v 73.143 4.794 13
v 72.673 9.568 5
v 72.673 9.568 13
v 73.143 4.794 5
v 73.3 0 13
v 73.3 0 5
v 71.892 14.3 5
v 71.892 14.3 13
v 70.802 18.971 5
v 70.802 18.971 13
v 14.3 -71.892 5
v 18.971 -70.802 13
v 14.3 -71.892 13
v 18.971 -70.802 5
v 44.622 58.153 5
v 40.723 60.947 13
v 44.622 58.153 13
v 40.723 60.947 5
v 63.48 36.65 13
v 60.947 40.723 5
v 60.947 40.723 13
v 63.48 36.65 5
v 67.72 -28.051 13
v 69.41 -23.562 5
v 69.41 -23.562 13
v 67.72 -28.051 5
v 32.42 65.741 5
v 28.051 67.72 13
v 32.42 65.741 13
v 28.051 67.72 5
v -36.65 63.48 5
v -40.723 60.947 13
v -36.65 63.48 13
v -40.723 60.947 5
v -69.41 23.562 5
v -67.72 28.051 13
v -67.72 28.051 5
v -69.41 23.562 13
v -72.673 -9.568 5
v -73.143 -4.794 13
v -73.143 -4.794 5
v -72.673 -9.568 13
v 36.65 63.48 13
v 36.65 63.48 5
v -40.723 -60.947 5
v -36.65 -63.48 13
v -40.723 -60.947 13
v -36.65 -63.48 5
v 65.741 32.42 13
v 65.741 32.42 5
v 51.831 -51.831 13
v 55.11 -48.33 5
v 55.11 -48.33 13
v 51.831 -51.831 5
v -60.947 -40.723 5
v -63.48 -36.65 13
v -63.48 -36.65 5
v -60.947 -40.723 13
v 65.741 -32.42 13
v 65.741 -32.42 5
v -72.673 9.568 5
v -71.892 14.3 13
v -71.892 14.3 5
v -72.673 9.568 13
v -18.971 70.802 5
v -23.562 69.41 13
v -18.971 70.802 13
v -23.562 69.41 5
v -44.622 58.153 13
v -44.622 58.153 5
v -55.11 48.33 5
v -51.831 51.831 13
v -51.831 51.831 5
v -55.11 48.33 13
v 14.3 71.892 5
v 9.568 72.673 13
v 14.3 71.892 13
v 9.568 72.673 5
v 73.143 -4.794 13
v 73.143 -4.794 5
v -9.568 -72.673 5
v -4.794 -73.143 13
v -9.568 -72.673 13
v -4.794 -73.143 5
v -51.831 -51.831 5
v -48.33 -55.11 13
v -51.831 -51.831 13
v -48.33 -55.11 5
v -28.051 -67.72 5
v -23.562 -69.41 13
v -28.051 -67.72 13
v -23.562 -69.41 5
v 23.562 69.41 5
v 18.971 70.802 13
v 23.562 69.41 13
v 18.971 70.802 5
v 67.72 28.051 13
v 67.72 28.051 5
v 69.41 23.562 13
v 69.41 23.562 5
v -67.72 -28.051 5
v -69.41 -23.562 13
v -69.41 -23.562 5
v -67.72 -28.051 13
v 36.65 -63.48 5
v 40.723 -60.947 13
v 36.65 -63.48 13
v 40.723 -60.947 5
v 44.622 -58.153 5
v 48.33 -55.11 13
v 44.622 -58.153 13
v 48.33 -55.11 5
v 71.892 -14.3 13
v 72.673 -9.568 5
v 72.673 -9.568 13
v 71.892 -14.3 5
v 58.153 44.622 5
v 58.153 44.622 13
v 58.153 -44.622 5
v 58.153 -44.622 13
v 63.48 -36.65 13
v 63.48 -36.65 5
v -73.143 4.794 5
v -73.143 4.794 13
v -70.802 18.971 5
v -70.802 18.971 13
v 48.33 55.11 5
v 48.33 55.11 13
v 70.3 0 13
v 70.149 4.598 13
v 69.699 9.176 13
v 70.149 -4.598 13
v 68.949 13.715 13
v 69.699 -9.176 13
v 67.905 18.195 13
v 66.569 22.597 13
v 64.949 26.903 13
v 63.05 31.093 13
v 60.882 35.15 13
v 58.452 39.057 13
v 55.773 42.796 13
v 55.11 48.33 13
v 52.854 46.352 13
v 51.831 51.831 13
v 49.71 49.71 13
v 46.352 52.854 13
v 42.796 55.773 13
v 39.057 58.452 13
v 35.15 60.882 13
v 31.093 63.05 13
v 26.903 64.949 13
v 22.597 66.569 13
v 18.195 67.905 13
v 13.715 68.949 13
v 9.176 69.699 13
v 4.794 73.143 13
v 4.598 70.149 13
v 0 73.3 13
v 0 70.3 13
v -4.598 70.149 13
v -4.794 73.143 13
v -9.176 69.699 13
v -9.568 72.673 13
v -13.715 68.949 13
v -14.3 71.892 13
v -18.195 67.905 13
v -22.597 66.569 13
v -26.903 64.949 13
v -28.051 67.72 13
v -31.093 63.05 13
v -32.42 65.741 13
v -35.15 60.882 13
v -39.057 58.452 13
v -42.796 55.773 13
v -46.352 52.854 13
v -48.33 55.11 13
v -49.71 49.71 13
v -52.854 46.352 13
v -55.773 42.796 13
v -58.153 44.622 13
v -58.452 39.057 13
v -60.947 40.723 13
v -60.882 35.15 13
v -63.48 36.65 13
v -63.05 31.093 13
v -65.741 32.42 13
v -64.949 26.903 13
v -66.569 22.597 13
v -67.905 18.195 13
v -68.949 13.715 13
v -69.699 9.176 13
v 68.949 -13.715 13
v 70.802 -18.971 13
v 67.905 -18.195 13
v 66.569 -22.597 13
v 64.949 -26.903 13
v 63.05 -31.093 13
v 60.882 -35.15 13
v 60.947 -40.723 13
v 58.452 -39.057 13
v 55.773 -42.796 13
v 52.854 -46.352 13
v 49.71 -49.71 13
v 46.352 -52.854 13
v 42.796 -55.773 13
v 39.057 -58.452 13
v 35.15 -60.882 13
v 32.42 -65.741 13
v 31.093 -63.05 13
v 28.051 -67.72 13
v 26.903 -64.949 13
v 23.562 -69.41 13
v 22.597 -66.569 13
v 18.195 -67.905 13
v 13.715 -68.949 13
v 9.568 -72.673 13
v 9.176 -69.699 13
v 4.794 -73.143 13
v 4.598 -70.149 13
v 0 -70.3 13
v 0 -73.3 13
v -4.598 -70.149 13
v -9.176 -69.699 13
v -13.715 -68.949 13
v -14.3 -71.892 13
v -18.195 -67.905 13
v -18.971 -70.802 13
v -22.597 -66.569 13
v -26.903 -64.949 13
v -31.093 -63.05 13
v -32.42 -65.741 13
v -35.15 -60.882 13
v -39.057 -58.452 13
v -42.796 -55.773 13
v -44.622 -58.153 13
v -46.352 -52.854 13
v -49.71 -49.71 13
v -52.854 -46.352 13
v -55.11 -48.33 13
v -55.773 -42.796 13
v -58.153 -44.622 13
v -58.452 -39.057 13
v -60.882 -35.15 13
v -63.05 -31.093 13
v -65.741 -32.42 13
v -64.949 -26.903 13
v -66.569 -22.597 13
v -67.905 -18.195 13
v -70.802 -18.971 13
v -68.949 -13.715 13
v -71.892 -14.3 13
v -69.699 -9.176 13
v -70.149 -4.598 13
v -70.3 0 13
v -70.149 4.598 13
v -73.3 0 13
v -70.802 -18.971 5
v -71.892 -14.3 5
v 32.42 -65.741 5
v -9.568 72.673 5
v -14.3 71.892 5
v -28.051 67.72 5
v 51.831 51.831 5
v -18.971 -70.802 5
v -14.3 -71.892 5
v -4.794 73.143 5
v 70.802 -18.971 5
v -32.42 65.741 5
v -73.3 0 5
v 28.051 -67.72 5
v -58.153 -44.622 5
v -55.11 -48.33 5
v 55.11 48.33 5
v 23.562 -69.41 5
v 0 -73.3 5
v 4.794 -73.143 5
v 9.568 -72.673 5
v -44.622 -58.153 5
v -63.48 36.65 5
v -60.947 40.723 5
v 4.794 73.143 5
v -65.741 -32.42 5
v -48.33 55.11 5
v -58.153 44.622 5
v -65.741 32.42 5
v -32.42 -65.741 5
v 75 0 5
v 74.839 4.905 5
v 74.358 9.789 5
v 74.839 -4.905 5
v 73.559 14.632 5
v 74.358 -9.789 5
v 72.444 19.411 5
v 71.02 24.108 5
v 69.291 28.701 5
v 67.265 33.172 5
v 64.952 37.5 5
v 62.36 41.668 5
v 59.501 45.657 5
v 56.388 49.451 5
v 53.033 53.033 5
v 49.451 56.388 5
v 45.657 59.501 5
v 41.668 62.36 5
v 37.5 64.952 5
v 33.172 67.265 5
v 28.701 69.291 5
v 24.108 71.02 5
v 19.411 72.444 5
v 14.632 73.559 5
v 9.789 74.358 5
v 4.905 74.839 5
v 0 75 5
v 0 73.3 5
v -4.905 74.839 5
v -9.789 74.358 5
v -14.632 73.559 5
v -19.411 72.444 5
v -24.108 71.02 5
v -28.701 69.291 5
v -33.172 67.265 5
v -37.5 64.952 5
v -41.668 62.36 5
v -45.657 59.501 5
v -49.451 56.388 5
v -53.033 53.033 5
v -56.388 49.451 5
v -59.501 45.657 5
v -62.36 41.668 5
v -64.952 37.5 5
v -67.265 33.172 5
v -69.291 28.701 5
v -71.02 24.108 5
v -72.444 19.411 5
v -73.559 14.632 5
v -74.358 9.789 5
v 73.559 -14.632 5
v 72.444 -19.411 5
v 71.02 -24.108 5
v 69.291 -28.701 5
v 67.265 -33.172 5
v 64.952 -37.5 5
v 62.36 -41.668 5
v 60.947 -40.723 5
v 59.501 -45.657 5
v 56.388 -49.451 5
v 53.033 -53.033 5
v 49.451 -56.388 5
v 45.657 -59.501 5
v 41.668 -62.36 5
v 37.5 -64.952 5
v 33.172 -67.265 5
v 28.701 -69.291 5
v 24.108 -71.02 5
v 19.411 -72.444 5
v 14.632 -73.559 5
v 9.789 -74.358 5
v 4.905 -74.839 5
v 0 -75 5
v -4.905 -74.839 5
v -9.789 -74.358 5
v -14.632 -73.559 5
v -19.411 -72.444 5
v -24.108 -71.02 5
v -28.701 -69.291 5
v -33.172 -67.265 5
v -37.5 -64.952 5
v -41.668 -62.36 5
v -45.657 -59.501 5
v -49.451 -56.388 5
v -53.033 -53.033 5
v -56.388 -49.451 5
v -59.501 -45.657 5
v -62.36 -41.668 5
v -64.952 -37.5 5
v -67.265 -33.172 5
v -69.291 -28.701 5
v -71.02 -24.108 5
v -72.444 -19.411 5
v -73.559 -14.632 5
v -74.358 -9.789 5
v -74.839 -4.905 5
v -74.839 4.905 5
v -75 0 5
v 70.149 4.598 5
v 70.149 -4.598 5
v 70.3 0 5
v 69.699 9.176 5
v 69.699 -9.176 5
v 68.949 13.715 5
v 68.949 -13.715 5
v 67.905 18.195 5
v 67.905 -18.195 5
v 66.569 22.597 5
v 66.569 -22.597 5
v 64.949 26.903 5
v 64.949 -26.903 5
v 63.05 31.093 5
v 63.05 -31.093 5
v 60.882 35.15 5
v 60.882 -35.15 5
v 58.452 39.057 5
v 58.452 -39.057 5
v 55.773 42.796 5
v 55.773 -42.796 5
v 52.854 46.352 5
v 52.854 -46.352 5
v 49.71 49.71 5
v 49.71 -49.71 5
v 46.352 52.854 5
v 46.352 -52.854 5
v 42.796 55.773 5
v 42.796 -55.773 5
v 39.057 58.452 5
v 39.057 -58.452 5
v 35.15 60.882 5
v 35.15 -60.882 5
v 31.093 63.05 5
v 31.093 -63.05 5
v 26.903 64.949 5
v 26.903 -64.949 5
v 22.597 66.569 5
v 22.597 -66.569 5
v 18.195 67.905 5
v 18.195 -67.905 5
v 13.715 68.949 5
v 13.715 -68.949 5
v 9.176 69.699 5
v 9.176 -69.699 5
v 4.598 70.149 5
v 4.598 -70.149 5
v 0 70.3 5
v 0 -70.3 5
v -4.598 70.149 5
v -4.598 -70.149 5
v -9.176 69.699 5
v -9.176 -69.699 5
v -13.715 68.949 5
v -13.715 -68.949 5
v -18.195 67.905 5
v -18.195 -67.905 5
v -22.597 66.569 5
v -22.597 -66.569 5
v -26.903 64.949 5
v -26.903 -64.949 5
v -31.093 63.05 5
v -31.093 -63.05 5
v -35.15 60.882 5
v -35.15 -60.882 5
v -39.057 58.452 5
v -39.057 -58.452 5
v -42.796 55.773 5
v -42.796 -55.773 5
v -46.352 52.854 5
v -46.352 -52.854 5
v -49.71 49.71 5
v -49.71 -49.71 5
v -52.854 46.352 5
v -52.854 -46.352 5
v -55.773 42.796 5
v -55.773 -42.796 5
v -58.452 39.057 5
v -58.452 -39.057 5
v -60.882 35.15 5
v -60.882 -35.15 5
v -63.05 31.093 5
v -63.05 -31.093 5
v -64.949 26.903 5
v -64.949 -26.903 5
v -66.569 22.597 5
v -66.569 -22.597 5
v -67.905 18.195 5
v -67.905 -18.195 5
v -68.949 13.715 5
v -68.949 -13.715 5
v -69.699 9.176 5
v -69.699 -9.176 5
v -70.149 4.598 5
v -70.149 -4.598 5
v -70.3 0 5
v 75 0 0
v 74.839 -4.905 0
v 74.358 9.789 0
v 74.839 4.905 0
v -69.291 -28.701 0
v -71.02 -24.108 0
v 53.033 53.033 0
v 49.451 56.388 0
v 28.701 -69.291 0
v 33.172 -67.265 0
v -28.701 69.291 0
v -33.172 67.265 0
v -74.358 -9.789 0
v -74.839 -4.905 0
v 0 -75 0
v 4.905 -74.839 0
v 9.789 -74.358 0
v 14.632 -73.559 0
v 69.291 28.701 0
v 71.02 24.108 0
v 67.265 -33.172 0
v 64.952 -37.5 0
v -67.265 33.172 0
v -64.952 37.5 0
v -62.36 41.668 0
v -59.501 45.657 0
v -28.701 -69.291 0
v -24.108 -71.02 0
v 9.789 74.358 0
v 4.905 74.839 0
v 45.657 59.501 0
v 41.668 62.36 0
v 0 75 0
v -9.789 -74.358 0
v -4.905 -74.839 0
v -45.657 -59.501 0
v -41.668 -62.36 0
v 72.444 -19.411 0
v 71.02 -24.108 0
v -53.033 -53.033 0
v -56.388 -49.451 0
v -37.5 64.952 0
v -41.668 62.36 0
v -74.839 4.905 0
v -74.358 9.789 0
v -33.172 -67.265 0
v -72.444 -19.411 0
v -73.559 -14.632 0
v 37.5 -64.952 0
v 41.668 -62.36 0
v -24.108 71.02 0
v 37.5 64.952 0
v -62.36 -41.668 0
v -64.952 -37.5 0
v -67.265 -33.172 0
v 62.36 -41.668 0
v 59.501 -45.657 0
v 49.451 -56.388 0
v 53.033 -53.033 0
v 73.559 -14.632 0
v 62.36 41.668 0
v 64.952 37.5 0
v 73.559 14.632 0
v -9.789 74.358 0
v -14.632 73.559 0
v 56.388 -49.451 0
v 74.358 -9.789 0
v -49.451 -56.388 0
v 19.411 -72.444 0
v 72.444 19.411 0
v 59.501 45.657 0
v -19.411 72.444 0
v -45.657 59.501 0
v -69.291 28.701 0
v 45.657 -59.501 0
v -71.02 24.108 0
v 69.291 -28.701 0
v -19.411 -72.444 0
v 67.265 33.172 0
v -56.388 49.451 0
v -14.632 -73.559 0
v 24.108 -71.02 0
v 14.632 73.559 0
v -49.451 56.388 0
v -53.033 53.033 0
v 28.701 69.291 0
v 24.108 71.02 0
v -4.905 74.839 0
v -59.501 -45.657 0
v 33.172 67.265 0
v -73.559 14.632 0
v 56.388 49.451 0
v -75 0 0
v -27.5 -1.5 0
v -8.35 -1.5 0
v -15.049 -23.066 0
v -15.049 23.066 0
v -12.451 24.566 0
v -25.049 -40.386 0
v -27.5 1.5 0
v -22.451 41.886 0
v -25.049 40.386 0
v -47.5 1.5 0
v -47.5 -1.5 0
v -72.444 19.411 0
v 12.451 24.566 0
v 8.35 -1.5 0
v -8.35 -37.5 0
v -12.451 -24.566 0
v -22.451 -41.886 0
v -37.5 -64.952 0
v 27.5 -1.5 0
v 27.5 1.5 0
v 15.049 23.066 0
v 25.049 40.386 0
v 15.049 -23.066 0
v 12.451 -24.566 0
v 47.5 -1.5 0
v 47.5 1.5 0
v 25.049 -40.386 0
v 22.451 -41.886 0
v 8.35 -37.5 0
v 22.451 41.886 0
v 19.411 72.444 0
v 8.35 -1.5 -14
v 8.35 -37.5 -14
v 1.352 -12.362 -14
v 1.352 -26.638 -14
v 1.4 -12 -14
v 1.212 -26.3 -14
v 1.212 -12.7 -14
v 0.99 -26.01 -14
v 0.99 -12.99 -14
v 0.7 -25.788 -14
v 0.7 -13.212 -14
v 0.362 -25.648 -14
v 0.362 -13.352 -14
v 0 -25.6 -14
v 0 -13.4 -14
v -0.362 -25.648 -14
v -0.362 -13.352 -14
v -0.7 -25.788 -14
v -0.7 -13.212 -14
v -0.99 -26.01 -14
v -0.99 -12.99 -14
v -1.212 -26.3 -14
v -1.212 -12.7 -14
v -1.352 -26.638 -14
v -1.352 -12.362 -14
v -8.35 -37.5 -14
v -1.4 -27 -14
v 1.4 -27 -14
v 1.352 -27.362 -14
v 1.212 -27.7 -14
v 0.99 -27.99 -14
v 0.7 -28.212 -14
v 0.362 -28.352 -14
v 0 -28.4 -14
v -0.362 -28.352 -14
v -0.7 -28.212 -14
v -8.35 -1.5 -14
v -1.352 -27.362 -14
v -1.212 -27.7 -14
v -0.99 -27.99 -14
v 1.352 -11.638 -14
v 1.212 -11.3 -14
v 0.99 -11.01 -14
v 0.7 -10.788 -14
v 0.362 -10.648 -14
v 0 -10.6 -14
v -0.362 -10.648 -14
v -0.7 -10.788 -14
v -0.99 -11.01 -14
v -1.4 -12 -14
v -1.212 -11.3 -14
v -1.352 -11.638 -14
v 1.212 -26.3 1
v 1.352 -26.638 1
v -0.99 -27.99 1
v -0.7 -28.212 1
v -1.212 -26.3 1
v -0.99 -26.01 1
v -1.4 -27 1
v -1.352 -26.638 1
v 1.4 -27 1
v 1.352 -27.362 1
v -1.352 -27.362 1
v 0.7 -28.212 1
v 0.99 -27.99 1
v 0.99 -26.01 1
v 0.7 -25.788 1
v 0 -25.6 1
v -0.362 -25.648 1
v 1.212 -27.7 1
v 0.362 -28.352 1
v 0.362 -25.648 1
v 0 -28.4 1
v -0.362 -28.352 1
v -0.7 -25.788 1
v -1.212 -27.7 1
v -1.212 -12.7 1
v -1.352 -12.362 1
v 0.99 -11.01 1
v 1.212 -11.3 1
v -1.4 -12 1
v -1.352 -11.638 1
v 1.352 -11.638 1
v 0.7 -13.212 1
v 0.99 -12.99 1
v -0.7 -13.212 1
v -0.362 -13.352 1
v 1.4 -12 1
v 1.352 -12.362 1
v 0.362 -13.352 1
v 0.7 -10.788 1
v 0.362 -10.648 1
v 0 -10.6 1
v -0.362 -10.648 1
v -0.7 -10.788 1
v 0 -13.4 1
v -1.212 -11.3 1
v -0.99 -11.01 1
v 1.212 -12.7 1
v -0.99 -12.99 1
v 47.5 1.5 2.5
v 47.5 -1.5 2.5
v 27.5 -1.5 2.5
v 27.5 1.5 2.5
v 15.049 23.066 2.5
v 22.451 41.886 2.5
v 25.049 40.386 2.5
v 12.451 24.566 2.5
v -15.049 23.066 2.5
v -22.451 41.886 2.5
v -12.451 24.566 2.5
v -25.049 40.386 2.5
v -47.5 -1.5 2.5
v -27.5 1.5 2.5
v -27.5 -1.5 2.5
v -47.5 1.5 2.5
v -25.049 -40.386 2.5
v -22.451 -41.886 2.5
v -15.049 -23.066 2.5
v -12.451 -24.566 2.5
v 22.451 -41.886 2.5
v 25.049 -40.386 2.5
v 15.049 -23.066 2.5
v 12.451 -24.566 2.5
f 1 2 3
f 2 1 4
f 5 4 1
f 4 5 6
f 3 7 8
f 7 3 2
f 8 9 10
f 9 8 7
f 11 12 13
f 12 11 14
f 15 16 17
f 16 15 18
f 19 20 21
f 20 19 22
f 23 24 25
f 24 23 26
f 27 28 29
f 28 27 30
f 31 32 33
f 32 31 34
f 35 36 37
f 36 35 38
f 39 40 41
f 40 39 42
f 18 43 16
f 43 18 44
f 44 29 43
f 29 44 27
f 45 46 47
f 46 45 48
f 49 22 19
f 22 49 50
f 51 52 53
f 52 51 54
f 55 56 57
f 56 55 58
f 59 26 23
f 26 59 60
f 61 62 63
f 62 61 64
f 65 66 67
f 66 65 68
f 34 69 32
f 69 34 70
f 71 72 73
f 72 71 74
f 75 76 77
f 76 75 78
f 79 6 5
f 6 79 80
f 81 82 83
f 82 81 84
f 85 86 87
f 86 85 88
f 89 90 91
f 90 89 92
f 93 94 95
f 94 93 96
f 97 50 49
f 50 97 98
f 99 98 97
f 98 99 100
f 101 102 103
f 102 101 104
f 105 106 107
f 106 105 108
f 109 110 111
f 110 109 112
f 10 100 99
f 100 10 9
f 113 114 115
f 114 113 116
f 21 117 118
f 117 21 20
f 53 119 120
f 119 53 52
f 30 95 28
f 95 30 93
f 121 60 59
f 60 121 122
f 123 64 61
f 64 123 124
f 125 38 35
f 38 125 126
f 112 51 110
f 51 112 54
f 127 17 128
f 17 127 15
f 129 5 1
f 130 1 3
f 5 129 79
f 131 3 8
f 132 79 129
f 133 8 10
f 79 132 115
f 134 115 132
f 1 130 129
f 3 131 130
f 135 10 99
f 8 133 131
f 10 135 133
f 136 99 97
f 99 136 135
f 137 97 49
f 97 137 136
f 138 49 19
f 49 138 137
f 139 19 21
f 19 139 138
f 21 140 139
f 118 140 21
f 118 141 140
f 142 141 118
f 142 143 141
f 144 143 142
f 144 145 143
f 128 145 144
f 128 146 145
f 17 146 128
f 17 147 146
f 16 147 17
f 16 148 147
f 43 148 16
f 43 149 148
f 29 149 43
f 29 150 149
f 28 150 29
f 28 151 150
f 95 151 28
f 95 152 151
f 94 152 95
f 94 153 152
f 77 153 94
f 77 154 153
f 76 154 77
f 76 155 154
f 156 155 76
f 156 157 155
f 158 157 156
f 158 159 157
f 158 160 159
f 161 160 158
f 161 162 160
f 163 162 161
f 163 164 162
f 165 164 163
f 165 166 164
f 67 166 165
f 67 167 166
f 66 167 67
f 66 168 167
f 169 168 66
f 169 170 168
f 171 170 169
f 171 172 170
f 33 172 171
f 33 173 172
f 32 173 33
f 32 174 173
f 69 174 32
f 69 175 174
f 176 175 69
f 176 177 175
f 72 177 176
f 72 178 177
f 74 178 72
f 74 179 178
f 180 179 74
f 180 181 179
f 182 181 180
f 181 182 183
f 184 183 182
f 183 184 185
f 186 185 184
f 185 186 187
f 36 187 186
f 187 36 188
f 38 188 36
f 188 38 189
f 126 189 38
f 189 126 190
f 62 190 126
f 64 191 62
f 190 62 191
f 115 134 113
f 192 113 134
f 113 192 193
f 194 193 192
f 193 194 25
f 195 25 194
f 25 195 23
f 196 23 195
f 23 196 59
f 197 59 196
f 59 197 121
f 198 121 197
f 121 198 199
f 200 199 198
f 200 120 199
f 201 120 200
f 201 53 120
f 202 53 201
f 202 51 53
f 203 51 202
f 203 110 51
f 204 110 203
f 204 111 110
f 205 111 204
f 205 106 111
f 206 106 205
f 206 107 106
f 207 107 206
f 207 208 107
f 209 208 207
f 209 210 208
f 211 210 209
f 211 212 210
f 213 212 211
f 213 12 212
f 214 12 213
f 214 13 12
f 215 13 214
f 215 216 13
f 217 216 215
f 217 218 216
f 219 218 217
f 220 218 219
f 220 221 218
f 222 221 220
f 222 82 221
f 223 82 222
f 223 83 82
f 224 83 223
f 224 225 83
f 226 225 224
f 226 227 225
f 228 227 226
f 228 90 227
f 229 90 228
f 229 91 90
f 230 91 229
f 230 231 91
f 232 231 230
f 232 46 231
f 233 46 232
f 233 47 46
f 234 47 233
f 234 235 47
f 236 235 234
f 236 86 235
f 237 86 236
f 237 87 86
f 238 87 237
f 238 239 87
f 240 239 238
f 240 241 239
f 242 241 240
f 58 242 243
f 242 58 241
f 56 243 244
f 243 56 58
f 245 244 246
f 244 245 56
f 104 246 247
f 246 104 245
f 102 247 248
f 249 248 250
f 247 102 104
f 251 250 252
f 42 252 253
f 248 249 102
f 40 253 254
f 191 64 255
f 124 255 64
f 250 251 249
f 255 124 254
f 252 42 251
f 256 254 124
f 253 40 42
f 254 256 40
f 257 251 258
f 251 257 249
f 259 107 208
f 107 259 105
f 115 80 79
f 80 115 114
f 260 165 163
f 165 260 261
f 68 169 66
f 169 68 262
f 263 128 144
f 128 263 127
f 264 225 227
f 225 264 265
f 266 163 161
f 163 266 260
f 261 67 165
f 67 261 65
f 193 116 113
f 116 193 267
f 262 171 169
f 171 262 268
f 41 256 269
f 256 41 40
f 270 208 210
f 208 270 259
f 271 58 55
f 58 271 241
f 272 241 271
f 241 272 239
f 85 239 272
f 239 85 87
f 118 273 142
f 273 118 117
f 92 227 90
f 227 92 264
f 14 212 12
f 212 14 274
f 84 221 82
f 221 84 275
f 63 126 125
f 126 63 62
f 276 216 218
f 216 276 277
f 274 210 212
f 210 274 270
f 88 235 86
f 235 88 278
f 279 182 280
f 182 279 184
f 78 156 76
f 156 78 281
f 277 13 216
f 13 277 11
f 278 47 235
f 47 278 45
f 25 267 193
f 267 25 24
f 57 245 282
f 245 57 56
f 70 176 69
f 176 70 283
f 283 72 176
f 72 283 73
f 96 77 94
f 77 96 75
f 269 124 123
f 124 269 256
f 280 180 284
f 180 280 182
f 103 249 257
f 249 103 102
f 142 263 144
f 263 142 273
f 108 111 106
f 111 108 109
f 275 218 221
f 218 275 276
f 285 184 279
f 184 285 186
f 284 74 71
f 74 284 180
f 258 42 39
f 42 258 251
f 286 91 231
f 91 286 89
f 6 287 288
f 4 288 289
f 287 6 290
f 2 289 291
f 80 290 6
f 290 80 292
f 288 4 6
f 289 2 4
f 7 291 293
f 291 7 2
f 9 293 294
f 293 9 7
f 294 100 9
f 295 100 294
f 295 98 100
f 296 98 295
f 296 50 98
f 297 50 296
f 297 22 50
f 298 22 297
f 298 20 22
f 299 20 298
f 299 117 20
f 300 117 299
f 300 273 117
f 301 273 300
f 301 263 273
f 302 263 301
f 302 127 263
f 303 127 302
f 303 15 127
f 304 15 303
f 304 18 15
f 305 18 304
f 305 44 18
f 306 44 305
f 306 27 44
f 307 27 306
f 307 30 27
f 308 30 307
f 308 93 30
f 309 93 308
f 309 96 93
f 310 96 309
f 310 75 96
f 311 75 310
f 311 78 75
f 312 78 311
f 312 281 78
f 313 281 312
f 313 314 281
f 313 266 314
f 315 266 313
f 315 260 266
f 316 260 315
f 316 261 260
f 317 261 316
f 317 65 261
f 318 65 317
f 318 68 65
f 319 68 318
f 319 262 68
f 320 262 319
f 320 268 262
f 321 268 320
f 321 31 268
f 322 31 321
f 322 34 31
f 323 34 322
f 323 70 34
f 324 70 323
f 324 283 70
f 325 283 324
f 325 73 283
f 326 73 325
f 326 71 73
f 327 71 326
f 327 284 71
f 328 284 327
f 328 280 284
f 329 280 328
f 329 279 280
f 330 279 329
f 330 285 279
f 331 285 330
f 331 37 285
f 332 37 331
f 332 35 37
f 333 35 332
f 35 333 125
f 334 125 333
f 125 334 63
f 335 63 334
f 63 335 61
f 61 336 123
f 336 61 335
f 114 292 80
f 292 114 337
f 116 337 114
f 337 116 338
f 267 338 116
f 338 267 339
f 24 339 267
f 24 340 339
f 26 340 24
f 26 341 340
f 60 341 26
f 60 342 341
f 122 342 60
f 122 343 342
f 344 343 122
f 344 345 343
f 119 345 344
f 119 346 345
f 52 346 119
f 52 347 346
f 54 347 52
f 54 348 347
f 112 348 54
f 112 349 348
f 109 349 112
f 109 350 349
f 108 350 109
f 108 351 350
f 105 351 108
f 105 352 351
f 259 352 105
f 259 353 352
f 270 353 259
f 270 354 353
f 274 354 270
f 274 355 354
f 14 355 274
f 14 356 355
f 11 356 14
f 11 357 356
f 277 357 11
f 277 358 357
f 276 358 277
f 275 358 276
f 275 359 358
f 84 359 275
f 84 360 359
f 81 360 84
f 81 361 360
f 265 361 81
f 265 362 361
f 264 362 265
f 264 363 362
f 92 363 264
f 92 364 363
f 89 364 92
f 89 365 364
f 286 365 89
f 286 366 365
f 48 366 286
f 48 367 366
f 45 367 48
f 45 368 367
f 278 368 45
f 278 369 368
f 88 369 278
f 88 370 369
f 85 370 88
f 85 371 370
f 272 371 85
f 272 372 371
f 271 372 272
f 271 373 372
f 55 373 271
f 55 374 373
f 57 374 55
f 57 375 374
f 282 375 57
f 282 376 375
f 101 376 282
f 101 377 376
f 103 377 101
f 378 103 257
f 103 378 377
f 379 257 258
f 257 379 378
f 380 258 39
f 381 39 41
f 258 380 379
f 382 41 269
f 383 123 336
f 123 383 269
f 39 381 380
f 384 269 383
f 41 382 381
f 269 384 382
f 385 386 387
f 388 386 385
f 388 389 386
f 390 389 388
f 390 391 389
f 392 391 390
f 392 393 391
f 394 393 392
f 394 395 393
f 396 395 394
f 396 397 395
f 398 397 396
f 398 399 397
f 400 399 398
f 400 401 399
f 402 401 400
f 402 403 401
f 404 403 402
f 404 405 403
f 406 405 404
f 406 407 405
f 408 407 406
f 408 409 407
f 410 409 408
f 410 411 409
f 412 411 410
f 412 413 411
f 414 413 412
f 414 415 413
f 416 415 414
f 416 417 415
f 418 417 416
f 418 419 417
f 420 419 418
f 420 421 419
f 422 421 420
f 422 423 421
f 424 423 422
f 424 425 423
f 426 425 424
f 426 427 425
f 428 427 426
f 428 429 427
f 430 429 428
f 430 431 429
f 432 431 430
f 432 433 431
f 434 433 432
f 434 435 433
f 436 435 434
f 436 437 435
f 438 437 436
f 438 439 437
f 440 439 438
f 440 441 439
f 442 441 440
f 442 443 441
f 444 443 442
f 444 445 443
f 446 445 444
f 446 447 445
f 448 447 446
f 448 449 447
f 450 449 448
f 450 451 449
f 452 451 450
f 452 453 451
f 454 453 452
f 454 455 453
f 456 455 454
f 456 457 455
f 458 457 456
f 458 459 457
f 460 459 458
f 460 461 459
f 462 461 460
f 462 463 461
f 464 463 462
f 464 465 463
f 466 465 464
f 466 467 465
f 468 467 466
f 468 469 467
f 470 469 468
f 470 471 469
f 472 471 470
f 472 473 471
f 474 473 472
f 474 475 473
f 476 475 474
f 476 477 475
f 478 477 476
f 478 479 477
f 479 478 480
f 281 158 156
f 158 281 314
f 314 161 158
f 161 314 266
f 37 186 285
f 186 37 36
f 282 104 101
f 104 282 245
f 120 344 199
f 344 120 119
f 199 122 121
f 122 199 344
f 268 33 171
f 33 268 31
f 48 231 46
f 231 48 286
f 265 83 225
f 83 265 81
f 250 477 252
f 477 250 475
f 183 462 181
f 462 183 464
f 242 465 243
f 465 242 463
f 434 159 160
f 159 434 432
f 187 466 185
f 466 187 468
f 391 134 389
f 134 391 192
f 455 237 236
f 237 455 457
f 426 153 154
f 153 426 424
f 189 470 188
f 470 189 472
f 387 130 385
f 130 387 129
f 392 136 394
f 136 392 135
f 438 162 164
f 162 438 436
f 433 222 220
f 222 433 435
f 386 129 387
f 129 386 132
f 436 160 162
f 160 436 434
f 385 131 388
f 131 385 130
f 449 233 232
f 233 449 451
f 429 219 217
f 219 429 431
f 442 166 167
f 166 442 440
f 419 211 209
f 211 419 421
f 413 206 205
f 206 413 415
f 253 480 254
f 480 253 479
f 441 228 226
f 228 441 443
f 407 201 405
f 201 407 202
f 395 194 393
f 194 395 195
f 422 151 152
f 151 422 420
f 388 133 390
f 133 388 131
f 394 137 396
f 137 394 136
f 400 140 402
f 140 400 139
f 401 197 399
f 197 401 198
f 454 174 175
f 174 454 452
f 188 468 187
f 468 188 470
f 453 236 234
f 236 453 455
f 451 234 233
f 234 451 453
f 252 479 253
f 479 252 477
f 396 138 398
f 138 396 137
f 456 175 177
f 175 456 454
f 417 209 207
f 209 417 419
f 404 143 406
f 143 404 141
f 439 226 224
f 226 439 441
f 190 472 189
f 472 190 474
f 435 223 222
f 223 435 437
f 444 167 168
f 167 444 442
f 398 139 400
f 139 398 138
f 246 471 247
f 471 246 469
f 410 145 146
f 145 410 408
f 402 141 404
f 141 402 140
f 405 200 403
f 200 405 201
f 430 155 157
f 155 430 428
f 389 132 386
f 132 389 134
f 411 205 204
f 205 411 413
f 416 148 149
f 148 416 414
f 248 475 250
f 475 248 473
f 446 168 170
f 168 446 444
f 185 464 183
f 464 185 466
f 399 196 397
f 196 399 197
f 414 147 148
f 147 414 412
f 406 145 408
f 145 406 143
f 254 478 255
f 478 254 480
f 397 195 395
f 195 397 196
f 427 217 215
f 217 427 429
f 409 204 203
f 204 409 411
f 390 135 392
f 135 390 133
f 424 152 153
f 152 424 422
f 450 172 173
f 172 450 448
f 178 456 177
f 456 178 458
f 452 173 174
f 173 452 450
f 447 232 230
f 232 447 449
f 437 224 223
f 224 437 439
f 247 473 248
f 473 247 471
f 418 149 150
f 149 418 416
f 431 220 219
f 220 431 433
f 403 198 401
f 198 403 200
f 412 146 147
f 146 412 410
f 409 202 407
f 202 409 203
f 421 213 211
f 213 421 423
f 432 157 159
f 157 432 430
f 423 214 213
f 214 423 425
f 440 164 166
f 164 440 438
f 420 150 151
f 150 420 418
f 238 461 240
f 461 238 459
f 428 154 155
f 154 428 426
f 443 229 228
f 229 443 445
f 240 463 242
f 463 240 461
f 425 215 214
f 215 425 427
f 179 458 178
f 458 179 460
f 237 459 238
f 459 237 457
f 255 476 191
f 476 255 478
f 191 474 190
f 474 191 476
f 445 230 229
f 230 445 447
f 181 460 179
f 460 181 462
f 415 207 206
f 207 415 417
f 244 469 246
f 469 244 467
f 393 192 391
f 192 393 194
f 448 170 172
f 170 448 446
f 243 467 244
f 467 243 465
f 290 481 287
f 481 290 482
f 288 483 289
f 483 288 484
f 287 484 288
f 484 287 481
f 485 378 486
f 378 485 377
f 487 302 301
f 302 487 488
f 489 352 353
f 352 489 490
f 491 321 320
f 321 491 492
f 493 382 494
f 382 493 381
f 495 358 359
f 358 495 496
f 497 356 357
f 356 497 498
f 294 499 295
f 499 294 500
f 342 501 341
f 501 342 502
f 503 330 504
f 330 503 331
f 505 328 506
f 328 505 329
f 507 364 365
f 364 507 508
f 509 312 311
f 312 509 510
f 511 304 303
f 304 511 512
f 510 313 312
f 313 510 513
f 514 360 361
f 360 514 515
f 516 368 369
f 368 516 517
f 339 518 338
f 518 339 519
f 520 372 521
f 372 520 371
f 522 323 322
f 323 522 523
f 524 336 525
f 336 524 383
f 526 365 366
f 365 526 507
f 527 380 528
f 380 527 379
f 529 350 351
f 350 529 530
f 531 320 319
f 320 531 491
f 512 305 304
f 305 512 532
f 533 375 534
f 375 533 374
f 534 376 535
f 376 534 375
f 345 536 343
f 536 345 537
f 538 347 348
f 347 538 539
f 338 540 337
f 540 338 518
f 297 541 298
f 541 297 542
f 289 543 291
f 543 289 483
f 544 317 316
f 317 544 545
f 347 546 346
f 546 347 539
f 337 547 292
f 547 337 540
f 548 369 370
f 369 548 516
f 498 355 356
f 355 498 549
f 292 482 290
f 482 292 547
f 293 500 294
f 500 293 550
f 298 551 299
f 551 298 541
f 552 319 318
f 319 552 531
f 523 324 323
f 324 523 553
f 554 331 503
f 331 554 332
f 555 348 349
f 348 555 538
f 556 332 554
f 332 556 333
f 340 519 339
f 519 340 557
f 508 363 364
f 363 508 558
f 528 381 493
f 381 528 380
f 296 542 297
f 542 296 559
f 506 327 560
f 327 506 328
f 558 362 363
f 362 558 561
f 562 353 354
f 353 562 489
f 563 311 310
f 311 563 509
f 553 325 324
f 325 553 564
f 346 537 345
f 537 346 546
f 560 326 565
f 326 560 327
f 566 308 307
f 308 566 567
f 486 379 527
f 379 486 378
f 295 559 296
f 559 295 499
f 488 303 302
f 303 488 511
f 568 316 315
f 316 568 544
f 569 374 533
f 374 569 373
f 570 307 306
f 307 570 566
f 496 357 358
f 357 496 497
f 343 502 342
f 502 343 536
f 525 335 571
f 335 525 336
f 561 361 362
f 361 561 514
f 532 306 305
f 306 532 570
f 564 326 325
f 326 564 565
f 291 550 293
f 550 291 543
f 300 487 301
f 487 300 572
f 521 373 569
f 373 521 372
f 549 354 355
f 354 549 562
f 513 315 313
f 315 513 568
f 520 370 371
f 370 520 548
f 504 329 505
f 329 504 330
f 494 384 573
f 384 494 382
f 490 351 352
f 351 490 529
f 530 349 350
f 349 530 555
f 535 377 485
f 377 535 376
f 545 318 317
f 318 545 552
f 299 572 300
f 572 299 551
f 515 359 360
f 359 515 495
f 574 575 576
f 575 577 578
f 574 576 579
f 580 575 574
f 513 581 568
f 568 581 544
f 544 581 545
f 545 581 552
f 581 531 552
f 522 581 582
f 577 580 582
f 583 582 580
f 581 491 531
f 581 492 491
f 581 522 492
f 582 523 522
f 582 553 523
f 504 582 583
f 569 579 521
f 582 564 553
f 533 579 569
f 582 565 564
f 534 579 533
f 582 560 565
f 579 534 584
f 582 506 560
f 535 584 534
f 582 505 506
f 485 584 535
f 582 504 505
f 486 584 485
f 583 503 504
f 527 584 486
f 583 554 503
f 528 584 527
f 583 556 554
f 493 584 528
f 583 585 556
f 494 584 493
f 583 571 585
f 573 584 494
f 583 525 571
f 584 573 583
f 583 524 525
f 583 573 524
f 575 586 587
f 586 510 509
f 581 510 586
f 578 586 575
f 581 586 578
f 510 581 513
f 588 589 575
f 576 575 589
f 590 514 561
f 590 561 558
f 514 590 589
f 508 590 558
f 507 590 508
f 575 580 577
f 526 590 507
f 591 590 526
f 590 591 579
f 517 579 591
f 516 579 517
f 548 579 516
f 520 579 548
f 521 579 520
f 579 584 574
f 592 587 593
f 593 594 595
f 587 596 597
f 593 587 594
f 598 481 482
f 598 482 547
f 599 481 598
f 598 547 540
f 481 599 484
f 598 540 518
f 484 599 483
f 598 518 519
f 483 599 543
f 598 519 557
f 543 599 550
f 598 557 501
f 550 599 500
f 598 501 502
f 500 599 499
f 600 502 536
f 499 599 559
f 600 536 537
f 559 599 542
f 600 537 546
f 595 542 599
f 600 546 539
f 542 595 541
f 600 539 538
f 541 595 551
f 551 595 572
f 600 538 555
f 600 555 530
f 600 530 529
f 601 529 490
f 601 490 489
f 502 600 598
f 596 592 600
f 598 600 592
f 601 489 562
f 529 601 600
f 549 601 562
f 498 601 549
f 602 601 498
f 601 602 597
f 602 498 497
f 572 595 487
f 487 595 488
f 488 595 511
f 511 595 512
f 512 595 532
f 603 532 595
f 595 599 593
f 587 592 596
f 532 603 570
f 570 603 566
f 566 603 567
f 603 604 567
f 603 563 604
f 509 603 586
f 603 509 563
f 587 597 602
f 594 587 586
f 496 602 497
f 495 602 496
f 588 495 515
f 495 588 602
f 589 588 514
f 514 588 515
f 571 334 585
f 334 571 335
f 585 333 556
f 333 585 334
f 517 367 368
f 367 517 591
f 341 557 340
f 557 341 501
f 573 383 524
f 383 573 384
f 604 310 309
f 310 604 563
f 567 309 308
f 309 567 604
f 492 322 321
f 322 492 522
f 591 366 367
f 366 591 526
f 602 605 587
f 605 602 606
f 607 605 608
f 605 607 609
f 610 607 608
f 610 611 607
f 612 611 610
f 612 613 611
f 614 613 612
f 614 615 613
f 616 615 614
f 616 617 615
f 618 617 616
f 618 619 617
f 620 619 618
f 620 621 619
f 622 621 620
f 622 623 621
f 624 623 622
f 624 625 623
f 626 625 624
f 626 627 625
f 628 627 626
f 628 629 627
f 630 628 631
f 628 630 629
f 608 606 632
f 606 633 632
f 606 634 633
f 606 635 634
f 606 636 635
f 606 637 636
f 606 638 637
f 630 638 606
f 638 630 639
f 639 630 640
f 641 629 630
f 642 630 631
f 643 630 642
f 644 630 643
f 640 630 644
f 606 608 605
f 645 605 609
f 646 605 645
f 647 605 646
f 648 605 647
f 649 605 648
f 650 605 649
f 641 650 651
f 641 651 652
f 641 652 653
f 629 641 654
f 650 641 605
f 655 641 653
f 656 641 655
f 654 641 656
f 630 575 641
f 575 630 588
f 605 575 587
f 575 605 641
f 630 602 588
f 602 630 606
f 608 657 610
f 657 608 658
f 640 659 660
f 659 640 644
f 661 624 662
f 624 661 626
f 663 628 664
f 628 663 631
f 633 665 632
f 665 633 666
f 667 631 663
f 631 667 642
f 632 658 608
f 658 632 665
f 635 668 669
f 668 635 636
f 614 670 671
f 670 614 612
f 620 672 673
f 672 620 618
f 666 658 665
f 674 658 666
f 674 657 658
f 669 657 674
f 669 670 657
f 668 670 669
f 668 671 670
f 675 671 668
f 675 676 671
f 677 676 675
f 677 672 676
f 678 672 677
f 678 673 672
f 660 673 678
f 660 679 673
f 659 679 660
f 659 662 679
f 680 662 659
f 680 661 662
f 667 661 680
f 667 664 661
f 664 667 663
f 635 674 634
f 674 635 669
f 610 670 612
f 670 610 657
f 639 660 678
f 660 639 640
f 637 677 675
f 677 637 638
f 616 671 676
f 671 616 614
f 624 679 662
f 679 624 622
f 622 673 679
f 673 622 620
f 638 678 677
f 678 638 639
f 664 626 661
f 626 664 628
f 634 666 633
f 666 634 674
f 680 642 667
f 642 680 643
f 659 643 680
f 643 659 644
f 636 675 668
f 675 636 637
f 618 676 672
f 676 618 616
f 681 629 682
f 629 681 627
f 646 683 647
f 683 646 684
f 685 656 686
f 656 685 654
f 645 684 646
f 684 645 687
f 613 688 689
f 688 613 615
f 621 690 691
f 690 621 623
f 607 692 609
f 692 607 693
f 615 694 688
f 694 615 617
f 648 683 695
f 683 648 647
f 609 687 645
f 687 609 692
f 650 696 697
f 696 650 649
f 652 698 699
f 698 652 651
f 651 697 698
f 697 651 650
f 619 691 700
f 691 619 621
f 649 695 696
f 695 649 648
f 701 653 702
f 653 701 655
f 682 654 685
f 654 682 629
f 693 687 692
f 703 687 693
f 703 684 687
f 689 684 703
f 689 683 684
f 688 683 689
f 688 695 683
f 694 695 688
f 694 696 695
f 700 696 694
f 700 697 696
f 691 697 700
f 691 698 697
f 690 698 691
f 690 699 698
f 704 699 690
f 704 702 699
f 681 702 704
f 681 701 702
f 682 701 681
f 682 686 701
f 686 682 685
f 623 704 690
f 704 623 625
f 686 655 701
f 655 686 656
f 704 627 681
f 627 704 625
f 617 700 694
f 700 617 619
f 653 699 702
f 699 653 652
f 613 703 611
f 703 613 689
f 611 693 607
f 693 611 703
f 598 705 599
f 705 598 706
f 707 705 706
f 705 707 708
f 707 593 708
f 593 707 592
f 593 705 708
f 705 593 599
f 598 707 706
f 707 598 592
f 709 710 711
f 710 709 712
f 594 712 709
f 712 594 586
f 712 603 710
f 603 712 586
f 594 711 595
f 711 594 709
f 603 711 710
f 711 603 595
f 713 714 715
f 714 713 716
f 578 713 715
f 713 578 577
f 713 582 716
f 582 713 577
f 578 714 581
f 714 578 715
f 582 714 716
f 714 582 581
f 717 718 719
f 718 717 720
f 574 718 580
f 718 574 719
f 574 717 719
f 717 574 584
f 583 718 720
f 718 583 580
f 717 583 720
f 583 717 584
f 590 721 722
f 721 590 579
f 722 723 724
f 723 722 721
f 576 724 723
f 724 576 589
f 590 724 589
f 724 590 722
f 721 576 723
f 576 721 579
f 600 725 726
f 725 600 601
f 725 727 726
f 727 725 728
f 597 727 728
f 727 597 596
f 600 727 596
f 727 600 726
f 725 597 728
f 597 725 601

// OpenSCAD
// file: common.scad
// common.scad — every dimension in the feeder lives here.
// Change a value, re-run ../check.sh, and every part regrows together.

/* ---------- Printer envelope ---------- */
bed_x = 220;
bed_y = 220;
bed_z = 250;

/* ---------- Material and process ---------- */
wall      = 2.0;    // nominal wall thickness (5 perimeters at 0.4 nozzle)
fit_slide = 0.30;   // clearance for parts that must move against each other
fit_press = 0.15;   // clearance for parts pressed together
$fn       = 96;

/* ---------- Fasteners ---------- */
m3_free = 3.4;      // M3 clearance hole
m3_tap  = 2.8;      // M3 self-tapping into plastic
m4_free = 4.5;

/* ---------- Load cells (VERIFY against the cells you actually buy) ----------
   Figures below are for the common YZC-133 straight bar. Bolt spacing varies
   between suppliers; measure yours before printing the base or the platform. */
cell_l            = 80;
cell_w            = 12.7;
cell_h            = 12.7;
cell_bolt_spacing = 15;   // centre-to-centre, at each end
cell_gap          = 3;    // spacer thickness — the beam MUST be free to flex

/* ---------- Food model ---------- */
kibble_density = 0.40;   // g/cm^3, dry kibble bulk density

/* ---------- Hopper ---------- */
hopper_volume_l = 2.0;
hopper_mouth    = 140;   // inner, square, at the top
hopper_throat   = 55;    // inner, square, at the bottom

// Square frustum volume: V = h/3 * (A1 + A2 + sqrt(A1*A2))
// For squares sqrt(A1*A2) collapses to mouth*throat, so height is exact:
hopper_h = 3 * hopper_volume_l * 1000000 /
           (hopper_mouth*hopper_mouth + hopper_throat*hopper_throat +
            hopper_mouth*hopper_throat);

hopper_run        = (hopper_mouth - hopper_throat) / 2;
hopper_wall_angle = atan(hopper_h / hopper_run);   // from horizontal
hopper_taper_rate = (hopper_mouth - hopper_throat) / hopper_h;
hopper_capacity_g = hopper_volume_l * 1000 * kibble_density;

/* ---------- Drum valve ---------- */
drum_dia       = 50;
drum_len       = 60;
drum_clearance = 0.4;                      // radial
drum_bore      = drum_dia + 2*drum_clearance;
pocket_depth   = 11.3;                     // segment depth of the scoop
shaft_dia      = 6;
shaft_len      = 8;

// Circular-segment maths. OpenSCAD trig is in DEGREES; the segment area
// formula needs the angle in RADIANS, hence the two forms below.
drum_r          = drum_dia / 2;
pocket_theta    = 2 * acos(1 - pocket_depth/drum_r);        // degrees
pocket_theta_r  = pocket_theta * PI / 180;                  // radians
pocket_area     = drum_r*drum_r/2 * (pocket_theta_r - sin(pocket_theta));
pocket_volume   = pocket_area * drum_len;                   // mm^3
sweep_grams     = pocket_volume / 1000 * kibble_density;    // DERIVED, not assumed

/* ---------- Valve housing ---------- */
housing_x = drum_len + 4*wall;      // along the drum axis
housing_y = drum_bore + 4*wall;
housing_z = drum_bore + 4*wall;
outlet_x  = 45;
outlet_y  = 45;

/* ---------- Chute ---------- */
chute_forward = 70;    // how far forward of the tower the food lands
chute_drop    = 90;    // vertical fall from valve outlet to chute exit
chute_exit    = 40;
chute_clear   = 40;    // exit height above the bowl rim — impulse, not load

/* ---------- Bowl and platform ---------- */
bowl_dia     = 140;    // the BOUGHT stainless/ceramic bowl
platform_dia = 150;
platform_t   = 5;
ring_w       = 3;
ring_h       = 8;
bowl_gap     = 6;      // air on every side — the isolation gap

/* ---------- Base and tower ---------- */
base_size = 190;
base_t    = 6;
bay_h     = 28;        // electronics bay height
tower_w   = 90;
tower_d   = 70;
tower_h   = 150;

/* ---------- Head ---------- */
head_tilt   = 30;      // camera, degrees down from horizontal
cam_pcb     = [40, 40, 1.6];
sr04_dia    = 16;
sr04_pitch  = 26;      // centre-to-centre of the two transducers

/* ---------- Derived overall ---------- */
total_h = base_t + bay_h + tower_h + housing_z + hopper_h;

/* ---------- Assertions: the things that silently ruin a print ---------- */
assert(hopper_wall_angle >= 60,
       str("Hopper wall ", hopper_wall_angle, " deg is below 60 - kibble will bridge"));
assert(hopper_h + 2*wall <= bed_z,
       str("Hopper ", hopper_h, " mm exceeds bed Z ", bed_z));
assert(hopper_mouth + 2*wall <= bed_x,
       "Hopper mouth exceeds bed X");
assert(base_size <= bed_x && base_size <= bed_y,
       "Base exceeds bed footprint");
assert(platform_dia <= bed_x, "Bowl platform exceeds bed X");
assert(drum_clearance > 0, "Drum clearance must be positive or the drum seizes");
assert(drum_bore > drum_dia, "Drum bore must exceed drum diameter");
assert(pocket_depth < drum_r,
       "Pocket deeper than the drum radius - the scoop would cut through the axis");
assert(sweep_grams > 6 && sweep_grams < 10,
       str("Sweep delivers ", sweep_grams, " g - outside the 6-10 g design window"));
assert(bowl_gap > 0, "Bowl isolation gap must be positive");
assert(cell_gap > 0, "Load cell needs a flex gap or it reads nothing");
assert(chute_forward + 40 <= bed_y,
       "Bowl arm exceeds bed Y - split it or shorten chute_forward");

/* ---------- Shared geometry ---------- */
// A square frustum, bottom face on the XY plane, centred on Z.
module frustum(bottom, top, h) {
  linear_extrude(height = h, scale = top/bottom)
    square([bottom, bottom], center = true);
}

// A rectangular tube used for the labyrinth lip on the lid and hopper mouth.
module lip(inner, thickness, h) {
  difference() {
    cube([inner + 2*thickness, inner + 2*thickness, h], center = true);
    cube([inner, inner, h + 1], center = true);
  }
}

// Four bolt holes on a square pattern.
module bolt_square(spacing, dia, h) {
  for (i = [0:3])
    rotate([0, 0, 90*i])
      translate([spacing/2, spacing/2, 0])
        cylinder(d = dia, h = h, center = true, $fn = 24);
}

// The cantilever footprint a load cell bolts into: two holes plus a relief slot.
module cell_mount(dia = m3_tap, h = 10) {
  for (y = [-cell_bolt_spacing/2, cell_bolt_spacing/2])
    translate([0, y, 0]) cylinder(d = dia, h = h, center = true, $fn = 24);
}

echo(str("hopper_h = ", hopper_h, " mm"));
echo(str("hopper wall angle = ", hopper_wall_angle, " deg"));
echo(str("hopper capacity = ", hopper_capacity_g, " g"));
echo(str("sweep = ", sweep_grams, " g"));
echo(str("total height = ", total_h, " mm"));
// main file
include <common.scad>

boss_l = cell_l * 0.45;
boss_w = cell_w + 2*wall;
boss_h = 14;

module bowl_platform() {
  difference() {
    union() {
      cylinder(d = platform_dia, h = platform_t);

      // Retaining ring that locates the bought bowl.
      translate([0, 0, platform_t])
        difference() {
          cylinder(d = bowl_dia + 2*ring_w + 2*fit_slide, h = ring_h);
          translate([0, 0, -1])
            cylinder(d = bowl_dia + 2*fit_slide, h = ring_h + 2);
        }

      // Cantilever boss on the underside — the ONLY thing that touches
      // anything else. The load cell bolts here; nothing else may.
      translate([-boss_w/2, -platform_dia/4, -boss_h])
        cube([boss_w, boss_l, boss_h], center = false);
    }

    // Load cell bolt holes through the boss.
    translate([0, -platform_dia/4 + boss_l/2, -boss_h/2])
      cell_mount(m3_tap, boss_h + 2);

    // Drain slots, so spilled water leaves the platform instead of sitting
    // on the cell.
    for (a = [0:60:359])
      rotate([0, 0, a]) translate([platform_dia/4, 0, -1])
        cube([20, 3, platform_t + 2], center = true);
  }
}

bowl_platform();
